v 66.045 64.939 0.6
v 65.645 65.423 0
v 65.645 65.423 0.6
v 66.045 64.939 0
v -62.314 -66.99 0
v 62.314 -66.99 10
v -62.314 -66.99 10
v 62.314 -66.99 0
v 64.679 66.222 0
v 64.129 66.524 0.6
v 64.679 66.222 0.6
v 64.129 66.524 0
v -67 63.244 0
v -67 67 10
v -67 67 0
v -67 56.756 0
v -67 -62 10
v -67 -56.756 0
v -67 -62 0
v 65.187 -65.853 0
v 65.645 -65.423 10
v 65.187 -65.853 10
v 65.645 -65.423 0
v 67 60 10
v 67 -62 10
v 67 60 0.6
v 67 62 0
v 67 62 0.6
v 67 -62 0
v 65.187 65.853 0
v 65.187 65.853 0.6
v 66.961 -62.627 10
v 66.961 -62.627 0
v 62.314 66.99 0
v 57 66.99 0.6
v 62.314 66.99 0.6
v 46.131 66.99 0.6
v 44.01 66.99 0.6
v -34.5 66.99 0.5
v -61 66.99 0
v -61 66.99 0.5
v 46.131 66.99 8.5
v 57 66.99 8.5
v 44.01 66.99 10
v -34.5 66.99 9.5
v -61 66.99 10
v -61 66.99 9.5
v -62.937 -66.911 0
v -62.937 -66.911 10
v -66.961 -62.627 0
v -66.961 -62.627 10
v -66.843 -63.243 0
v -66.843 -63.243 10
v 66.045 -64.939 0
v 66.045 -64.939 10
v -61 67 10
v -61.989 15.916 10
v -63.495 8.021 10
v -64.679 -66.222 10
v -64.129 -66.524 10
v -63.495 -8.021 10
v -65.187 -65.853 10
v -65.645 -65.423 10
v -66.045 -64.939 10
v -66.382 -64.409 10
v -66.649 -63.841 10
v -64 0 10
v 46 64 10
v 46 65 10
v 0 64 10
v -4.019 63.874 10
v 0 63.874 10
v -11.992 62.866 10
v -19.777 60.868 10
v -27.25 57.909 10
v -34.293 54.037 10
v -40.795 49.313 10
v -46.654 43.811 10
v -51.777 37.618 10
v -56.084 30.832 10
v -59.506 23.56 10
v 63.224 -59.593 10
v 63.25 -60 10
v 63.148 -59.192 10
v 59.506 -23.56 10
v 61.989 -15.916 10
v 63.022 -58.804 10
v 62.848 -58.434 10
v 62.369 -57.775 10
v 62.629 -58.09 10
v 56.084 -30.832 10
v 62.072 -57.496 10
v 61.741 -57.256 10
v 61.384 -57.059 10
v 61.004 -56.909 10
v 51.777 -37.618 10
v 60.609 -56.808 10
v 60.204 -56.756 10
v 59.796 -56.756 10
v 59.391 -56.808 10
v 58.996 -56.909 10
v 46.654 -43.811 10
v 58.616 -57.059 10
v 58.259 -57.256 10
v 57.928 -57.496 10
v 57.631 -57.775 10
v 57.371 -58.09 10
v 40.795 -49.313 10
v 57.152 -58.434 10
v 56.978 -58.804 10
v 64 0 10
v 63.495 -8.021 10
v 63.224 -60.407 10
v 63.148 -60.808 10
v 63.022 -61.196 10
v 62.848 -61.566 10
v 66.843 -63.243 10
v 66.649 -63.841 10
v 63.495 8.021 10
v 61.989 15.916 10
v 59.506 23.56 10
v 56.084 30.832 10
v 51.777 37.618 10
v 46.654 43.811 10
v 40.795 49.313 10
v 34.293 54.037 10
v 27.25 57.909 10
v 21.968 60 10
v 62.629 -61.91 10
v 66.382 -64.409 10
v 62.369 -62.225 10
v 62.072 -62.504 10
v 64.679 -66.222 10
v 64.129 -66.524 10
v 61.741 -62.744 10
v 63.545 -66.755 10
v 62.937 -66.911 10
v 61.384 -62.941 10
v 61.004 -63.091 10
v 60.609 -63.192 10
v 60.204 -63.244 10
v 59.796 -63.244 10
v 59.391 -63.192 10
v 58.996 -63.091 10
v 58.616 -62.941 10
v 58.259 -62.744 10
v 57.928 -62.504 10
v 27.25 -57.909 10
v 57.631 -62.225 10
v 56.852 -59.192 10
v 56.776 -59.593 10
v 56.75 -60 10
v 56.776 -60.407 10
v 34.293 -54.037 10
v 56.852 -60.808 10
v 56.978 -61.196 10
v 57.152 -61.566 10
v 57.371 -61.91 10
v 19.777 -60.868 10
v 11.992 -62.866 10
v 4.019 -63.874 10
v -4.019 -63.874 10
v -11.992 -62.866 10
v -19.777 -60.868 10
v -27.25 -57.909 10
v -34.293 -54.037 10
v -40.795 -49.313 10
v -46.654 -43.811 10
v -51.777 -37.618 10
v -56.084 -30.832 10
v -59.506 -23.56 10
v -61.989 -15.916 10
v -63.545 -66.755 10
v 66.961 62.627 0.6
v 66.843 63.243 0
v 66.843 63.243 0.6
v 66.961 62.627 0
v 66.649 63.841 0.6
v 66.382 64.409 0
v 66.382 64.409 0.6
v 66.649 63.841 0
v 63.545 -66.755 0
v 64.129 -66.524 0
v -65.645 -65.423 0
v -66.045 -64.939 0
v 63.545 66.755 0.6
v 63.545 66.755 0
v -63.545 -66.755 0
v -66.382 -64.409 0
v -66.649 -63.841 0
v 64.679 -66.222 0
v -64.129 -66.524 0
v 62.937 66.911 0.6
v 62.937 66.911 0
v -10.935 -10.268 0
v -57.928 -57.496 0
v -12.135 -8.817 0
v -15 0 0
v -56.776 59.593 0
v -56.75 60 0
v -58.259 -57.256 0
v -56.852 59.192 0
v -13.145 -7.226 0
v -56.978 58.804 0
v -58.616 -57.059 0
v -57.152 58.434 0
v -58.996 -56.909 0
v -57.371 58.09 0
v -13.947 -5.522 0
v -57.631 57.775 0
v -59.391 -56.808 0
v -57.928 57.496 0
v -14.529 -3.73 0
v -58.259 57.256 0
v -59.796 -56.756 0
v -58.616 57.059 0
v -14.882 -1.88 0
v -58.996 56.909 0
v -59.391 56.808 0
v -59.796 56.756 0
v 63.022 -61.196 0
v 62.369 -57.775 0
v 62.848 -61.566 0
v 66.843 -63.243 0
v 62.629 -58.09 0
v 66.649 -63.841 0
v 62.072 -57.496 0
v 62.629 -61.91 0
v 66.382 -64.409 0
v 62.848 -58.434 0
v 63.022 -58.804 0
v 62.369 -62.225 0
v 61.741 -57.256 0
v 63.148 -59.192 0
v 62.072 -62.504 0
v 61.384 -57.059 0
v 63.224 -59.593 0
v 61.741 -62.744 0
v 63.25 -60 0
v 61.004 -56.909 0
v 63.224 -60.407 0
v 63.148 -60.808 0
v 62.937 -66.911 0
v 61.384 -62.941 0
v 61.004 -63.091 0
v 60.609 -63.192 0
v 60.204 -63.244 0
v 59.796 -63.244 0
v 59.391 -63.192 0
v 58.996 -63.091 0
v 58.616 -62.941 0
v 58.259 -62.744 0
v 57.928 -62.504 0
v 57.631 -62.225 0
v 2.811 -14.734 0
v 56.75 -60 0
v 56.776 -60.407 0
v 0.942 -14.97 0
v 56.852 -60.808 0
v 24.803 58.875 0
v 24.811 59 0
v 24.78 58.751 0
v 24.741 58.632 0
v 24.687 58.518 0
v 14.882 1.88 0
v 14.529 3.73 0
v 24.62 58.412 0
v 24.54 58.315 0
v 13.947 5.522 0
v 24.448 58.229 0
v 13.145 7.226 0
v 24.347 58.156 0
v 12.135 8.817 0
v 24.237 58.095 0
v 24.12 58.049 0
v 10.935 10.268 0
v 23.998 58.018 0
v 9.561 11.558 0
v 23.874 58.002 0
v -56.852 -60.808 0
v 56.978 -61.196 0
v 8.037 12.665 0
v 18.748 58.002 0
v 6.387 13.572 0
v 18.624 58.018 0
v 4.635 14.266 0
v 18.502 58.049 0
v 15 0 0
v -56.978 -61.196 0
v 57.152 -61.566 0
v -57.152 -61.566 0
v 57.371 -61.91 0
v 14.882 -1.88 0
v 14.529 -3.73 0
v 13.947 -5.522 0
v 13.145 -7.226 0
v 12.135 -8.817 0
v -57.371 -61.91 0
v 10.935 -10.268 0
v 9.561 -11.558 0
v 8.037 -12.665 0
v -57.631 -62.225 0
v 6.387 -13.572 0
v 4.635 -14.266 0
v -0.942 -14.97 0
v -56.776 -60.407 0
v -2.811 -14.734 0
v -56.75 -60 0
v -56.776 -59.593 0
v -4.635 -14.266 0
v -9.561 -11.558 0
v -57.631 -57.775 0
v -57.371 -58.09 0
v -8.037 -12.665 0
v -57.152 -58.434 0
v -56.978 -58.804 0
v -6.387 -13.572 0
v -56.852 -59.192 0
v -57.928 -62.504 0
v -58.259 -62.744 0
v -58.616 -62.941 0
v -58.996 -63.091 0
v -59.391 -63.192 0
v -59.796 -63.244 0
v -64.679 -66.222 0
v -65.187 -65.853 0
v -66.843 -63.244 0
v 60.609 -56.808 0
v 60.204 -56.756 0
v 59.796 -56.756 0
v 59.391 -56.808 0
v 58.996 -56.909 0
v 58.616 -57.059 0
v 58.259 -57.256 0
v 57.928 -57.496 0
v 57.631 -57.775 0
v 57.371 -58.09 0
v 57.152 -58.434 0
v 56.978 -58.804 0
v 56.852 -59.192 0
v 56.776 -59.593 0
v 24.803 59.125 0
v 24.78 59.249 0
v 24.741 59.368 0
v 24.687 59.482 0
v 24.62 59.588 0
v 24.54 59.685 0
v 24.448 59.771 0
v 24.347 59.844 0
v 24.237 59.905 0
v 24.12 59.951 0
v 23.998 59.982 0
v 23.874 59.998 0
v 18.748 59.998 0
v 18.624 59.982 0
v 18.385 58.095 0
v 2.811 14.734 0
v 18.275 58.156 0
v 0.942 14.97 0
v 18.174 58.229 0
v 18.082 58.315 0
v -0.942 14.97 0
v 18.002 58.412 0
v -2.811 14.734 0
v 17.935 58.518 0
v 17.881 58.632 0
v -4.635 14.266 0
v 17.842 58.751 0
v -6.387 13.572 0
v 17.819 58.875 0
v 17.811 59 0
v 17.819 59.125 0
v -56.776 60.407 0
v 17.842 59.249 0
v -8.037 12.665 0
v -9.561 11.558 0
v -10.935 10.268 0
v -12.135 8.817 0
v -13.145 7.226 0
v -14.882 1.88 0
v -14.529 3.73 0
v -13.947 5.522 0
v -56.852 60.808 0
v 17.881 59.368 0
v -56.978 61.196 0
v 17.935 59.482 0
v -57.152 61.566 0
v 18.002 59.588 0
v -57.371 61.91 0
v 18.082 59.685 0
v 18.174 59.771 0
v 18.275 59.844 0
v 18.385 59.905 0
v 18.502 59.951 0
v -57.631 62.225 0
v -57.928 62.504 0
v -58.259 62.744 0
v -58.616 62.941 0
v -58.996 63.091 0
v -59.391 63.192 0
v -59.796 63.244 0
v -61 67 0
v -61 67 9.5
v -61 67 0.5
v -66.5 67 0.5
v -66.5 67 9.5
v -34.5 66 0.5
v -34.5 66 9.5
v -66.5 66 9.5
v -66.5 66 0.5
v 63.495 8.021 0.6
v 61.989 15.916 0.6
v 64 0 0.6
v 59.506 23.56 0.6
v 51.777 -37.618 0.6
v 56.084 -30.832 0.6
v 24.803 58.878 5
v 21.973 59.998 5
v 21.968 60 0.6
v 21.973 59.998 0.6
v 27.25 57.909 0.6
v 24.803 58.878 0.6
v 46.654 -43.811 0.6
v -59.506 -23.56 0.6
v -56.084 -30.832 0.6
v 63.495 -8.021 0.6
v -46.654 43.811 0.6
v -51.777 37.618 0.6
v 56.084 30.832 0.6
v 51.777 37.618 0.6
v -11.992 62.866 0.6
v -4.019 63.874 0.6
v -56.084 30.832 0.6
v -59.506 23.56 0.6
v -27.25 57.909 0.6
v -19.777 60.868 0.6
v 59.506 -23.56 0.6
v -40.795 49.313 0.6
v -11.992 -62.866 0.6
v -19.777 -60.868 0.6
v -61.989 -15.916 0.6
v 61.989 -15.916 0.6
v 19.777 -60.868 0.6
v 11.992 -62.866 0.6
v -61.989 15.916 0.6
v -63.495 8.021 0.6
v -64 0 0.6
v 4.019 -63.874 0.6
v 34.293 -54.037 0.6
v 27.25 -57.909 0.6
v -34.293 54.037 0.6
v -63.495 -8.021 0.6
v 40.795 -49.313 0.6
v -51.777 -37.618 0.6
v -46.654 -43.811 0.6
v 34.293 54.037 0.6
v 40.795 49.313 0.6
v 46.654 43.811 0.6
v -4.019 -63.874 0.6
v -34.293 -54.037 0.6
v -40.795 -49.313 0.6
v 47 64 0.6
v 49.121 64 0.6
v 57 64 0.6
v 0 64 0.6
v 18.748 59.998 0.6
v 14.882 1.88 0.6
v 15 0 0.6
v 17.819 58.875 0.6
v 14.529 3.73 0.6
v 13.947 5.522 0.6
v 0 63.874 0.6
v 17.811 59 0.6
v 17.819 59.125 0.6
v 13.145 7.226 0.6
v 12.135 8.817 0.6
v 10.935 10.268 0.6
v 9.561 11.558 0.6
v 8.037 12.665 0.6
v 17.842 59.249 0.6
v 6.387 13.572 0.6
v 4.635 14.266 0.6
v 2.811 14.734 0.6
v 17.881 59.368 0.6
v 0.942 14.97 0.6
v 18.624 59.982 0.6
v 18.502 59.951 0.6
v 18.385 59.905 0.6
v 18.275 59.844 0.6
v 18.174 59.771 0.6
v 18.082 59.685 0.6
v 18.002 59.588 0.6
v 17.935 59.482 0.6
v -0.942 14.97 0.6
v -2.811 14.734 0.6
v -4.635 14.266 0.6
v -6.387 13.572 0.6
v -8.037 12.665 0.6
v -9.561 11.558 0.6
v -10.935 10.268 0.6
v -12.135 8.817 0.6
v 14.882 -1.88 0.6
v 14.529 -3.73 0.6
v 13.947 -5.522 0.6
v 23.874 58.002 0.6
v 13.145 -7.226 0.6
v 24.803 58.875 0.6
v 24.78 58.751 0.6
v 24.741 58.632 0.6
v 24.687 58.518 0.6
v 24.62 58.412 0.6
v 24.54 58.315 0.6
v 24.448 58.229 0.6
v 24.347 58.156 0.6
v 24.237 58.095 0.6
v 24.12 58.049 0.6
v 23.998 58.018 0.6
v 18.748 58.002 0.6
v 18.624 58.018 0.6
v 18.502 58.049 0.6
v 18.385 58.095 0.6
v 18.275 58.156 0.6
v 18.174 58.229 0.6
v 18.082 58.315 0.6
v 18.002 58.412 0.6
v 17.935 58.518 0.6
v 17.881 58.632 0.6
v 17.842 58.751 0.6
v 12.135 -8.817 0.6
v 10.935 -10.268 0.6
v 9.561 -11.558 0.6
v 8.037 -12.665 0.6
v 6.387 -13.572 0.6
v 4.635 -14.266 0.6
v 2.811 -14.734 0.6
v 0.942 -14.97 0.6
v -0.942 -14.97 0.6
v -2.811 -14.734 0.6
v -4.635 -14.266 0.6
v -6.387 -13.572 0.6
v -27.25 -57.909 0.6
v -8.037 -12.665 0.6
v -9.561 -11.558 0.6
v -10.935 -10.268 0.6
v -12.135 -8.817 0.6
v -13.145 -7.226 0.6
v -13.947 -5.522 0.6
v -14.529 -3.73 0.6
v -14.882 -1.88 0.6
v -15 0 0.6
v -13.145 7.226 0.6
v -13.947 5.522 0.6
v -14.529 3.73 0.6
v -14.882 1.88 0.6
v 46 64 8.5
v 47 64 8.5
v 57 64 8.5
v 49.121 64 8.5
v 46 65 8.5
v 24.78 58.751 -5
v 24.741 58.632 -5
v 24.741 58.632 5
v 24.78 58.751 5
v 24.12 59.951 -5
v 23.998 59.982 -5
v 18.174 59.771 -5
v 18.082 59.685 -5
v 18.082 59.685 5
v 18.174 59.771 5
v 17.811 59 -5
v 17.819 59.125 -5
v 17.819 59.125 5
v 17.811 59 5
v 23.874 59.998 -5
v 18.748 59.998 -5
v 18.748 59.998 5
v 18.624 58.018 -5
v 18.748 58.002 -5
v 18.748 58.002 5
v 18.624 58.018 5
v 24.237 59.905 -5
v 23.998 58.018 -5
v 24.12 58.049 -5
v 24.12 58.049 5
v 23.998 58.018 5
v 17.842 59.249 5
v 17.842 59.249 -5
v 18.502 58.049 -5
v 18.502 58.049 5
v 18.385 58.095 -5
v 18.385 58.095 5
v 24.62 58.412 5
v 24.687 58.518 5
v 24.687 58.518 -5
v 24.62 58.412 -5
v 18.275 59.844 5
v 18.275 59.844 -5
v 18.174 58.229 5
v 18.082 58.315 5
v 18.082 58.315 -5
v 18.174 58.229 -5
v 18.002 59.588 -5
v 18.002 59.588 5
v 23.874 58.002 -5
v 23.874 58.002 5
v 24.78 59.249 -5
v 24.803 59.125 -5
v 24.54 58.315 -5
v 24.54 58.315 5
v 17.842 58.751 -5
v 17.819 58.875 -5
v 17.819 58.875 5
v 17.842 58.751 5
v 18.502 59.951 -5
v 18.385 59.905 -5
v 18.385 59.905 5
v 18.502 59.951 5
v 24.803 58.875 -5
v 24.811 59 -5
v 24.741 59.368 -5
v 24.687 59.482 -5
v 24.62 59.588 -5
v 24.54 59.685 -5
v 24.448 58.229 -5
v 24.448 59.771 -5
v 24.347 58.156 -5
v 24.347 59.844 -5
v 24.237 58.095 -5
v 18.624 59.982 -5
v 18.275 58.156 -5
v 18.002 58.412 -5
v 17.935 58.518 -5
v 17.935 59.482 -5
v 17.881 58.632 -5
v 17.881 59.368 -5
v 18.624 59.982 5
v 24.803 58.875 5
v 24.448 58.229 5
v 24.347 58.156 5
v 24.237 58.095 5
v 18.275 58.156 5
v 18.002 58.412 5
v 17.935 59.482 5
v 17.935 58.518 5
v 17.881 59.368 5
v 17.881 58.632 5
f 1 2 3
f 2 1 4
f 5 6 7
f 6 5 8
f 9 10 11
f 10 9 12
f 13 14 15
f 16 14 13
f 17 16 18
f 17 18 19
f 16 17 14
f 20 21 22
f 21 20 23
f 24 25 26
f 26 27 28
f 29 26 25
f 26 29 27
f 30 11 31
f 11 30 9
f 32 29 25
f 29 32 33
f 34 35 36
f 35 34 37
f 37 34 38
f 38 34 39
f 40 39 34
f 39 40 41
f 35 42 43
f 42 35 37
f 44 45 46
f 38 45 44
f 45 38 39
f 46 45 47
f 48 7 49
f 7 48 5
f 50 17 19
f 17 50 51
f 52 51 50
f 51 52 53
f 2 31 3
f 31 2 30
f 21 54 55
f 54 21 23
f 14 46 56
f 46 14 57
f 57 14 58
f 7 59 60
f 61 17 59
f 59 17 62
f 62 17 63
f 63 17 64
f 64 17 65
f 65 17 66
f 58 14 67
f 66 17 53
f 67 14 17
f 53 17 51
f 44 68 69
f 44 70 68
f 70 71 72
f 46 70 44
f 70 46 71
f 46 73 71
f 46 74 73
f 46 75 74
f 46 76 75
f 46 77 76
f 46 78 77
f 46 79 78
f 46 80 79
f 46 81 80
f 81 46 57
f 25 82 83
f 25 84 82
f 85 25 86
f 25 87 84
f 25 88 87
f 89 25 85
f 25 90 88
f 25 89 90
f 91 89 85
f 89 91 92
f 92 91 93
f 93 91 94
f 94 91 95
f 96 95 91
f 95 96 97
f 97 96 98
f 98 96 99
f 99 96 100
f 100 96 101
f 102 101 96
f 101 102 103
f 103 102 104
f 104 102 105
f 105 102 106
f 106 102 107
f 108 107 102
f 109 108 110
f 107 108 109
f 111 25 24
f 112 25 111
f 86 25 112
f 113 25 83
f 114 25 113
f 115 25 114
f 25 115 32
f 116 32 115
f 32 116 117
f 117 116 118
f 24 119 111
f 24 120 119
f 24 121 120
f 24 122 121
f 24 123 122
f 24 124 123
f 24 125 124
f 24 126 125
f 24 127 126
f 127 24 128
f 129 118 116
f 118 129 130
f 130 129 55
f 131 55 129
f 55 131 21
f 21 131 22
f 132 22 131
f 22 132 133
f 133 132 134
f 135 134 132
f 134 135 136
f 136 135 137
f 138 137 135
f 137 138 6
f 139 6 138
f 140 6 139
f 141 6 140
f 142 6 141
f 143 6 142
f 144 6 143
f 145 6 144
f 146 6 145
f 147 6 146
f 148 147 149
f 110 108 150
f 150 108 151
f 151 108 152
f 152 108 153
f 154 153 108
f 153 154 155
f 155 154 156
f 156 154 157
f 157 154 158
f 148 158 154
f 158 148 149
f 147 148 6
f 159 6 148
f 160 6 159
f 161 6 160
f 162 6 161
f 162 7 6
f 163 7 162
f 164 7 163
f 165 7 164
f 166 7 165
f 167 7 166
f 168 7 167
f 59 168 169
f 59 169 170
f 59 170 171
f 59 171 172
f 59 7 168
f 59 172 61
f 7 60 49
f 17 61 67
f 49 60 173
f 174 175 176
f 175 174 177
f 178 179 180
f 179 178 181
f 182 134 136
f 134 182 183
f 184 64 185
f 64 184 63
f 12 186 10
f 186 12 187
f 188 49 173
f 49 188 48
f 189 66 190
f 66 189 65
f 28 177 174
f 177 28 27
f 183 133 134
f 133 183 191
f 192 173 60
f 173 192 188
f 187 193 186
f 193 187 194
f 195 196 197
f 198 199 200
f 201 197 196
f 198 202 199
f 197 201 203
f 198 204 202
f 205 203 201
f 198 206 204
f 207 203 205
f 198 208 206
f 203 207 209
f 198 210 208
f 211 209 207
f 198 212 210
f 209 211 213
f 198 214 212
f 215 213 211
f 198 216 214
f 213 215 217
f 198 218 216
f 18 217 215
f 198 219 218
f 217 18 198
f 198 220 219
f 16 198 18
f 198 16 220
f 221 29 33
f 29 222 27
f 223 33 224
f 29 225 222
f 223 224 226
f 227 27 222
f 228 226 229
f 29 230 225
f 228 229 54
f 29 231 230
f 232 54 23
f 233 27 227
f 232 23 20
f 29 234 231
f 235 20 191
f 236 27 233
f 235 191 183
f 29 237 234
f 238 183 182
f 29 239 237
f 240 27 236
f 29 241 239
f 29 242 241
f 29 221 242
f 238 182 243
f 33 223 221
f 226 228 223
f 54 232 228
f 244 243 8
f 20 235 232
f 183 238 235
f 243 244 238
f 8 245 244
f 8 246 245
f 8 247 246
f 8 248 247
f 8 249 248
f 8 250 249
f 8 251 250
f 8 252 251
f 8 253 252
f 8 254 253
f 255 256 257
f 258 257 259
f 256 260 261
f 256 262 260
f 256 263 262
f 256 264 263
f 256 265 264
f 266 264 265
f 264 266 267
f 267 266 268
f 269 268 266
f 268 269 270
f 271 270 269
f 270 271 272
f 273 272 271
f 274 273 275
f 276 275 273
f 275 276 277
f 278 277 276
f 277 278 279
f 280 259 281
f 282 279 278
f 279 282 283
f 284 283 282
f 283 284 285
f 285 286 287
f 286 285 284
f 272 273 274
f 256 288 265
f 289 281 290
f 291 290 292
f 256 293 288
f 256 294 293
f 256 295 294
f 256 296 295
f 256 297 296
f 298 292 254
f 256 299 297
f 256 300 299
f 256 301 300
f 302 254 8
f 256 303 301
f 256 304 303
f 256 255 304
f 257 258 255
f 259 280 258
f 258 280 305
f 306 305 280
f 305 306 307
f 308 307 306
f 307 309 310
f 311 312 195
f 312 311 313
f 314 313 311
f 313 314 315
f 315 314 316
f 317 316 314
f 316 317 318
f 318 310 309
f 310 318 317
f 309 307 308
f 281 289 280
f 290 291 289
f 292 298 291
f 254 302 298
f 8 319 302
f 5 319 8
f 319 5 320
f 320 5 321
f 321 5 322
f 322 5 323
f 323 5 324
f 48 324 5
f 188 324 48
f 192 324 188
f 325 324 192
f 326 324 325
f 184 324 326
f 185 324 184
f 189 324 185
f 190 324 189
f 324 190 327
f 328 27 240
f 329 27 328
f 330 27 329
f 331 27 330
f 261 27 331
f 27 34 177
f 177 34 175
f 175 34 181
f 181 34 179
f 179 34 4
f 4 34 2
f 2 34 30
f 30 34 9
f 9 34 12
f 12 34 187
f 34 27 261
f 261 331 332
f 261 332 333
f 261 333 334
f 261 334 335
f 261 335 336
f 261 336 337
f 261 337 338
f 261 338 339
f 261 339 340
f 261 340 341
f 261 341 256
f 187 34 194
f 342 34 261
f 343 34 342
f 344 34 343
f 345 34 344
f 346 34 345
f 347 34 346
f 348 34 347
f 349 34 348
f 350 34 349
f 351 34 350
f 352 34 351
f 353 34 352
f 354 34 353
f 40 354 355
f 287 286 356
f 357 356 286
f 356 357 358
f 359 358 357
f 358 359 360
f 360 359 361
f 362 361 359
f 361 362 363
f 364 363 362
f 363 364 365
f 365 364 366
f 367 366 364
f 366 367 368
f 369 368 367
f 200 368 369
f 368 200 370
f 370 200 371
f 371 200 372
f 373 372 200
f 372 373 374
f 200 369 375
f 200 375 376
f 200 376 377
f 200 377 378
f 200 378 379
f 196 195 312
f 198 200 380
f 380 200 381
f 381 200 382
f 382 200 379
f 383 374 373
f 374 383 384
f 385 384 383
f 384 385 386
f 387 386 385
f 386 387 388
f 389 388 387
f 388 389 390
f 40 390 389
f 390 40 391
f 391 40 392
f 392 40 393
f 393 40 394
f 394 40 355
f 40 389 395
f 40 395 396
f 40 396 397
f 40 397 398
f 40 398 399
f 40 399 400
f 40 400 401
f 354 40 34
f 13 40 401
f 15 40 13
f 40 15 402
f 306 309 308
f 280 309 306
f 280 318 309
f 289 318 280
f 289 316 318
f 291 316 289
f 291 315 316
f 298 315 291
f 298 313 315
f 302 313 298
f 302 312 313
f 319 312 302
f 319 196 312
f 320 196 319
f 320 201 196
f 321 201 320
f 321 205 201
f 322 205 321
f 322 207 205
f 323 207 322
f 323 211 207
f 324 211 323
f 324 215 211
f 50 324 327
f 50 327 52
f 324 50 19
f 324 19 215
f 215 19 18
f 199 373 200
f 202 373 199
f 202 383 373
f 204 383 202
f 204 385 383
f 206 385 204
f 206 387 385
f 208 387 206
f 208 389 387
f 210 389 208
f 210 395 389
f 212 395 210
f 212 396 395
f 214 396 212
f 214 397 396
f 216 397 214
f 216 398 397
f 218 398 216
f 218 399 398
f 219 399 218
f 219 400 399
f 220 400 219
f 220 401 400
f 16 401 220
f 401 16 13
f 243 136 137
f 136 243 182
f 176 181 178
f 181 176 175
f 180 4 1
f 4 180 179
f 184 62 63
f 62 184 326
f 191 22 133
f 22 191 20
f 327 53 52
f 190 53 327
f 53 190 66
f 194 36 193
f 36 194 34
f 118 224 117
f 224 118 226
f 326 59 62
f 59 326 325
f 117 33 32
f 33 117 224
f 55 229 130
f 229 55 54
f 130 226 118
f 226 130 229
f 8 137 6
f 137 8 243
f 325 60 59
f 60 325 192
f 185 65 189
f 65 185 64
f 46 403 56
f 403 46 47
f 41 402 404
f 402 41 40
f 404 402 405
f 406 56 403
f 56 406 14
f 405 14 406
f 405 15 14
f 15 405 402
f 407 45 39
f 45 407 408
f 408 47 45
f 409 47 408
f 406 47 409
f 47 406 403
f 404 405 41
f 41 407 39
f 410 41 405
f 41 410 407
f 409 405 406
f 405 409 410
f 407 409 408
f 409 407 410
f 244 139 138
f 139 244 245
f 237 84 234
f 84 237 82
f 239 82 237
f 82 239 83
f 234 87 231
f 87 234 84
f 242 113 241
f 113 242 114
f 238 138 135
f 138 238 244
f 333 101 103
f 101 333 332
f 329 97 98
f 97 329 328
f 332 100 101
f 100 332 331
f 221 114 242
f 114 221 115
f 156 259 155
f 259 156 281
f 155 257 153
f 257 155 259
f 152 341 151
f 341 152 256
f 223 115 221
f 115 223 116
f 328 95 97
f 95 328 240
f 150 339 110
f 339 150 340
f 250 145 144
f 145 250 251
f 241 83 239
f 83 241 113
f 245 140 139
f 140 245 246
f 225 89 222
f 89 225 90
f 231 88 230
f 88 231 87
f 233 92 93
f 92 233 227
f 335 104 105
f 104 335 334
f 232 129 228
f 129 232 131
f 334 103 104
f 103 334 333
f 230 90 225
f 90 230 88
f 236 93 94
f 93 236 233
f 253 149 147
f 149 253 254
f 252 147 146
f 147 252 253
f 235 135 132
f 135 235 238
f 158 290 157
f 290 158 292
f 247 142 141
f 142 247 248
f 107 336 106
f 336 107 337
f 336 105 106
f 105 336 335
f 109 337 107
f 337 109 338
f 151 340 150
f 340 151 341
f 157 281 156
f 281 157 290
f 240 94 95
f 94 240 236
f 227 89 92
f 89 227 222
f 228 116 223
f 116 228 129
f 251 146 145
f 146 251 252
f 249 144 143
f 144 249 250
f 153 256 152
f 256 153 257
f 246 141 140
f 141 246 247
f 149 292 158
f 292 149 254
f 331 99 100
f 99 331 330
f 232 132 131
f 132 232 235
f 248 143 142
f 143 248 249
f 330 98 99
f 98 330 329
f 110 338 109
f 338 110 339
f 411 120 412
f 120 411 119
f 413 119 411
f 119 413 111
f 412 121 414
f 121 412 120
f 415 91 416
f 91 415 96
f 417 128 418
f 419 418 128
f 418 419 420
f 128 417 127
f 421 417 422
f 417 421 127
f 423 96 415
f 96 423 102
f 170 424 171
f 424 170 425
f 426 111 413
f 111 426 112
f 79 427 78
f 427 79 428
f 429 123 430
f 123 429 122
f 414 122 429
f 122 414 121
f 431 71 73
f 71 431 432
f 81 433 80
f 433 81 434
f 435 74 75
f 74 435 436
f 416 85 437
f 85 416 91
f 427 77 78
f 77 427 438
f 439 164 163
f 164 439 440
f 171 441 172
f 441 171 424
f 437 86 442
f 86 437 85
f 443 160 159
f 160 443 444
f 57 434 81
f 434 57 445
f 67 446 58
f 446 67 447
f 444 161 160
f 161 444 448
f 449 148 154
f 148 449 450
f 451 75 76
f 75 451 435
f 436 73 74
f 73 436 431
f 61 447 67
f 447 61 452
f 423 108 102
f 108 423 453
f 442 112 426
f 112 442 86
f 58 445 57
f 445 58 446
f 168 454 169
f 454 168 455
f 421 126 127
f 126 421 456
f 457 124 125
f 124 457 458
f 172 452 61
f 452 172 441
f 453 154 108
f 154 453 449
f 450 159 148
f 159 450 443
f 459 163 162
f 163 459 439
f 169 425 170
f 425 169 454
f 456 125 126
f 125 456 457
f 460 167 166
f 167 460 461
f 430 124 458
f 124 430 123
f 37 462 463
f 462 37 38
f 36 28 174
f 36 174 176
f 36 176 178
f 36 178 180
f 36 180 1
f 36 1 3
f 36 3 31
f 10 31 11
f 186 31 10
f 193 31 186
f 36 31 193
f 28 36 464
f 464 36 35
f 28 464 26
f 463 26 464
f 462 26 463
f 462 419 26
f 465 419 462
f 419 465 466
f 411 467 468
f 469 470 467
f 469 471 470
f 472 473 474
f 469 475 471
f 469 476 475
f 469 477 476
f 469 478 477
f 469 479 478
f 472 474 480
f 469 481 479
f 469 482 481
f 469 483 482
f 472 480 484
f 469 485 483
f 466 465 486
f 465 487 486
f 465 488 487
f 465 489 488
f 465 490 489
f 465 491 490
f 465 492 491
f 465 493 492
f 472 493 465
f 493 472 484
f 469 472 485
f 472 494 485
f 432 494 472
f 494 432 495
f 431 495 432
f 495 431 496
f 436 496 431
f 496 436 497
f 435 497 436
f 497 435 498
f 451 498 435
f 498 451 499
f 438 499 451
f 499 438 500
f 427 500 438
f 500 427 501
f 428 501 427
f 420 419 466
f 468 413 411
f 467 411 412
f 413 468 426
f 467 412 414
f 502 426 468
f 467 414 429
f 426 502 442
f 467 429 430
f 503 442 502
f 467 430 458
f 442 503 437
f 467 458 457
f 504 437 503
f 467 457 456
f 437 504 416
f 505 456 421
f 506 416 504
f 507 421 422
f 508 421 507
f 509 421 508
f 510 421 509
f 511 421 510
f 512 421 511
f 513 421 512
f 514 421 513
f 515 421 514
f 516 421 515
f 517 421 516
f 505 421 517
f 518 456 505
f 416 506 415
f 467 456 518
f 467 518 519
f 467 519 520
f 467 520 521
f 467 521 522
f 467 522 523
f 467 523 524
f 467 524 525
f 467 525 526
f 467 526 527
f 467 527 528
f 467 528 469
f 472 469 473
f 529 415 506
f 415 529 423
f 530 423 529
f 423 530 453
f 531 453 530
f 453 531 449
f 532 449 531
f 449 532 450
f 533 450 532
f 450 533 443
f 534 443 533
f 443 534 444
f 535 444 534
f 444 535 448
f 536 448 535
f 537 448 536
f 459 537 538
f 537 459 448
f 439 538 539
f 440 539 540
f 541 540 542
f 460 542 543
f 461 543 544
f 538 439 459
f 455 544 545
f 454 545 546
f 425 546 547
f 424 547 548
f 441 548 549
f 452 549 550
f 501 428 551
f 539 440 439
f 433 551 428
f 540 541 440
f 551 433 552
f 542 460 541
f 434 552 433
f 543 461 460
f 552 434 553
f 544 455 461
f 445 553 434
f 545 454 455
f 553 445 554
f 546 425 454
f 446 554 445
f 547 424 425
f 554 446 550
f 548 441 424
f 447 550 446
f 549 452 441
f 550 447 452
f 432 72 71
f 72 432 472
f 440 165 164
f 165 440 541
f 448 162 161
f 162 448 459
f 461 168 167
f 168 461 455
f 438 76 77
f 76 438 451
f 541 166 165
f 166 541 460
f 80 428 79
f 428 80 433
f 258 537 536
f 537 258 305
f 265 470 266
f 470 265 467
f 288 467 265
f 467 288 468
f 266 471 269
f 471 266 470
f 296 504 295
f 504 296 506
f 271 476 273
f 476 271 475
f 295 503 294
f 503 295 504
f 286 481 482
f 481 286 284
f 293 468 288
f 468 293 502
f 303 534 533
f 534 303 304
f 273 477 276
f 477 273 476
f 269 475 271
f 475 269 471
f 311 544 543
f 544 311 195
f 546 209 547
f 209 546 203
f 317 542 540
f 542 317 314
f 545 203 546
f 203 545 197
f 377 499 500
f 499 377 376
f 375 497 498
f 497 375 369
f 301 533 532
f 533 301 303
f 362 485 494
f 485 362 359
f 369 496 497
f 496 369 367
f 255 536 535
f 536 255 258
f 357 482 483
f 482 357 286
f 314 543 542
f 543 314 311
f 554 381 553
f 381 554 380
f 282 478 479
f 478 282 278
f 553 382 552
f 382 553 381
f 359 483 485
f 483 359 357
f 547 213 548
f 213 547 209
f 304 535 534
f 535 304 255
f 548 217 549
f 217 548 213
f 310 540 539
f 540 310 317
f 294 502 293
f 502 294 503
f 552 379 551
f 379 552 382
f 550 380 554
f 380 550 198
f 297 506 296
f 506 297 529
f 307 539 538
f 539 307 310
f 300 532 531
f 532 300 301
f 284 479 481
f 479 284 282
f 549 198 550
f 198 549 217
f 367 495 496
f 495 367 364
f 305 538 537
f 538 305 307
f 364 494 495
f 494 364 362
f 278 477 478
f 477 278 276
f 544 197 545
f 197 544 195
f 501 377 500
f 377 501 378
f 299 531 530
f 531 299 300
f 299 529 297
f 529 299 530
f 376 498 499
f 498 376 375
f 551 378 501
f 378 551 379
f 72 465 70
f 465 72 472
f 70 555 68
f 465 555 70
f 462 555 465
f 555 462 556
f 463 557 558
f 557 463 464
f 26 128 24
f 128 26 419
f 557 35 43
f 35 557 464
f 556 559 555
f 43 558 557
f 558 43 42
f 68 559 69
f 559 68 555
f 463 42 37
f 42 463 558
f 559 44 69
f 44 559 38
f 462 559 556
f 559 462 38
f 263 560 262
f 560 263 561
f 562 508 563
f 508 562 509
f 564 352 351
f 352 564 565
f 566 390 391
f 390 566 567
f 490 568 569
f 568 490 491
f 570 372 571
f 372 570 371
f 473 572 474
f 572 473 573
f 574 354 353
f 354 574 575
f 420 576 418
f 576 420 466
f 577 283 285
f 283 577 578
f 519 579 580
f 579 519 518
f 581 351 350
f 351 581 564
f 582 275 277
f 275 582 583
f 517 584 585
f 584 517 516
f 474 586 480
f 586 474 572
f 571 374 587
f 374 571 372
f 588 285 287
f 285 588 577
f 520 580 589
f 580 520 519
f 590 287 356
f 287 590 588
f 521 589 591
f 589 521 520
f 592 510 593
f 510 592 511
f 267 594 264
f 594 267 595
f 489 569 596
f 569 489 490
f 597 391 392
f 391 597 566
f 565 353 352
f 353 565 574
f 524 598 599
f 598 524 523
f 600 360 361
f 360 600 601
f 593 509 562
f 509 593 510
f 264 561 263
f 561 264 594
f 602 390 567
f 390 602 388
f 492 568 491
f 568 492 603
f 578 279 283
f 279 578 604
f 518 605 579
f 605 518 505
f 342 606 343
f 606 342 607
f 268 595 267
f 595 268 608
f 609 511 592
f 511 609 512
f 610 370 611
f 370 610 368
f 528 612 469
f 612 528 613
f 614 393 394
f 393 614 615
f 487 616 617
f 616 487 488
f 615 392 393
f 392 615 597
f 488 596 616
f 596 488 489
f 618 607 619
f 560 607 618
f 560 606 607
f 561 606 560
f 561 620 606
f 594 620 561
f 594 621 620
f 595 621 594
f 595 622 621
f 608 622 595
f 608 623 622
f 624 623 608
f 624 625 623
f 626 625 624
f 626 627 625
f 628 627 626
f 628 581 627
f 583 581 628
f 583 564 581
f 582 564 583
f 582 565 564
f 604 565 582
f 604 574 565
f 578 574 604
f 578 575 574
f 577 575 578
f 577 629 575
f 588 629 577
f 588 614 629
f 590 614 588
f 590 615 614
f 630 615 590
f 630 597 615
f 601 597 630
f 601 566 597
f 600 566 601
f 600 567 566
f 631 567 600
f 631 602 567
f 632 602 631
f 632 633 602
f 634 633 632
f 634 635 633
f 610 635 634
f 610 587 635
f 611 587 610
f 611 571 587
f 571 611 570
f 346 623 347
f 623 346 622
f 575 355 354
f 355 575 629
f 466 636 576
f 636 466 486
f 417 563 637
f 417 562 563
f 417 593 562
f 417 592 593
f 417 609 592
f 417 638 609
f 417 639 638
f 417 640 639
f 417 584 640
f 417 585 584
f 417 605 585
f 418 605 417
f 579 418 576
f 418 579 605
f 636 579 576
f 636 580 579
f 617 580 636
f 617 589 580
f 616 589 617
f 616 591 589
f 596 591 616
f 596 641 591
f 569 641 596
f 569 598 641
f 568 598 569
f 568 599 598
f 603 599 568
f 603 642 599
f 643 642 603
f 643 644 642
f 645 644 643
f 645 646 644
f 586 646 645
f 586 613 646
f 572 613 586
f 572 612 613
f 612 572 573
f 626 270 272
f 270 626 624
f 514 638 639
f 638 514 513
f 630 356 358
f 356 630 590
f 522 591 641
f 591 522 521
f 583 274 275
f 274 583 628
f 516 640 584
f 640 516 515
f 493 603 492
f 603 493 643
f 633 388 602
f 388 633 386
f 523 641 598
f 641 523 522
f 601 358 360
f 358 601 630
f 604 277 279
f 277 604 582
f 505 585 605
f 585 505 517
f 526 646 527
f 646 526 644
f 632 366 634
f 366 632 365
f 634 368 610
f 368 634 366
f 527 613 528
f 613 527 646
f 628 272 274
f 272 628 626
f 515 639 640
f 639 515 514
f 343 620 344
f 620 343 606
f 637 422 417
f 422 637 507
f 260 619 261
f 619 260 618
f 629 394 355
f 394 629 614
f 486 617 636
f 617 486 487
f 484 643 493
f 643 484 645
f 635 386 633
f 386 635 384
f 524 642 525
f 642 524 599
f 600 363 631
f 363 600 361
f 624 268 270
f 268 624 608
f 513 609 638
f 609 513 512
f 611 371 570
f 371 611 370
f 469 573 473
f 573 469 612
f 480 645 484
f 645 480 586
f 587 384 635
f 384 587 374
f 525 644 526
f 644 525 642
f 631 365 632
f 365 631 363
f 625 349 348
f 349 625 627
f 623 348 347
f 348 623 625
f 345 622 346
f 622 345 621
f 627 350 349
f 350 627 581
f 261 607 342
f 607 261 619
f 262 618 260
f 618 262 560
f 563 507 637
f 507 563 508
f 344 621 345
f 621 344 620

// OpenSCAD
$fn = 50;


union() {
	difference() {
		union() {
			hull() {
				translate(v = [-62.0000000000, 62.0000000000, 0]) {
					cylinder(h = 10, r = 5);
				}
				translate(v = [62.0000000000, 62.0000000000, 0]) {
					cylinder(h = 10, r = 5);
				}
				translate(v = [-62.0000000000, -62.0000000000, 0]) {
					cylinder(h = 10, r = 5);
				}
				translate(v = [62.0000000000, -62.0000000000, 0]) {
					cylinder(h = 10, r = 5);
				}
			}
			translate(v = [-67.0000000000, 61.0000000000, 0]) {
				cube(size = [6, 6, 10]);
			}
		}
		union() {
			translate(v = [-67.5000000000, -60.0000000000, -250.0000000000]) {
				rotate(a = [0, 0, 0]) {
					difference() {
						union() {
							hull() {
								translate(v = [7.5000000000, 0, 0]) {
									cylinder(h = 250, r = 3.2500000000, r1 = 3.2500000000, r2 = 3.2500000000);
								}
								translate(v = [-7.5000000000, 0, 0]) {
									cylinder(h = 250, r = 3.2500000000, r1 = 3.2500000000, r2 = 3.2500000000);
								}
							}
						}
						union();
					}
				}
			}
			translate(v = [-67.5000000000, 60.0000000000, -250.0000000000]) {
				rotate(a = [0, 0, 0]) {
					difference() {
						union() {
							hull() {
								translate(v = [7.5000000000, 0, 0]) {
									cylinder(h = 250, r = 3.2500000000, r1 = 3.2500000000, r2 = 3.2500000000);
								}
								translate(v = [-7.5000000000, 0, 0]) {
									cylinder(h = 250, r = 3.2500000000, r1 = 3.2500000000, r2 = 3.2500000000);
								}
							}
						}
						union();
					}
				}
			}
			translate(v = [-66.5000000000, 66.0000000000, 0.5000000000]) {
				cube(size = [32, 1, 9.0000000000]);
			}
			translate(v = [60.0000000000, -60.0000000000, 0]) {
				cylinder(h = 100, r = 3.2500000000);
			}
			translate(v = [0, 0, 0.6000000000]) {
				cylinder(h = 12.4000000000, r = 64.0000000000);
			}
			translate(v = [0, 0, -5.0000000000]) {
				cylinder(h = 10, r = 15.0000000000);
			}
			translate(v = [0.0000000000, 60.0000000000, 0.6000000000]) {
				cube(size = [67.0000000000, 4, 12.4000000000]);
			}
			translate(v = [57.0000000000, 60.0000000000, 0.6000000000]) {
				cube(size = [10, 7, 12.4000000000]);
			}
			translate(v = [46.0000000000, 60.0000000000, 8.5000000000]) {
				cube(size = [21, 7, 1.5000000000]);
			}
			translate(v = [43.2500000000, 67.7500000000, 0.6000000000]) {
				rotate(a = [0, 0, -45]) {
					cube(size = [7.5000000000, 1.5000000000, 12.4000000000]);
				}
			}
			translate(v = [12.0610000000, 58.0000000000, 0.6000000000]) {
				cube(size = [7.5000000000, 2, 9.4000000000]);
			}
		}
	}
	union() {
		translate(v = [21.3110000000, 59.0000000000, -5.0000000000]) {
			rotate(a = [0, 0, 0]) {
				difference() {
					union() {
						#hull() {
							#translate(v = [2.5000000000, 0, 0]) {
								cylinder(h = 10, r = 1.0000000000, r1 = 1.0000000000, r2 = 1.0000000000);
							}
							#translate(v = [-2.5000000000, 0, 0]) {
								cylinder(h = 10, r = 1.0000000000, r1 = 1.0000000000, r2 = 1.0000000000);
							}
						}
					}
					union();
				}
			}
		}
	}
}
